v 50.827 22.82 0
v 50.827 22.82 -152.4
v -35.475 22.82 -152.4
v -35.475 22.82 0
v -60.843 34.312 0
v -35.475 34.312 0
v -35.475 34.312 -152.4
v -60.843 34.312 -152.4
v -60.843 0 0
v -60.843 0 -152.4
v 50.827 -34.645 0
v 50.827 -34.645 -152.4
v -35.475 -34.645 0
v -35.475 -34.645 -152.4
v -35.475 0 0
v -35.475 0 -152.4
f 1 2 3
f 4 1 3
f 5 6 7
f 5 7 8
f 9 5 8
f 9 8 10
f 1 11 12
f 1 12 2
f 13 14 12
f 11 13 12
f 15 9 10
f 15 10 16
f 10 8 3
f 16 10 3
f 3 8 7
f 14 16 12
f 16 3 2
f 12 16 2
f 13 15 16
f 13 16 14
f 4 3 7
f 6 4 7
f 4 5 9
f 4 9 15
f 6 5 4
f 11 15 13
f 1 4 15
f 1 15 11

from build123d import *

# Parameters (mm, degrees)
F3_DEPTH = 152.4


# Not quite as in the source:
# - a feature of the source that left no trace in its solid (it failed there, or was rolled back) is left out


with BuildPart() as f3:
    # F2 (on Top) → F3 (new body)
    with BuildSketch(Plane.XY):
        Polygon((-35.4751944542, 0), (-35.4751944542, -34.6453338861), (50.8269667625, -34.6453338861), (50.8269667625, 22.8202939034), (-35.4751944542, 22.8202939034), align=None)
        Polygon((-60.8430989087, 0), (-35.4751944542, 0), (-35.4751944542, 22.8202939034), (-35.4751944542, 34.3115627766), (-60.8430989087, 34.3115627766), align=None)
    extrude(amount=-F3_DEPTH)


solid = f3.part
